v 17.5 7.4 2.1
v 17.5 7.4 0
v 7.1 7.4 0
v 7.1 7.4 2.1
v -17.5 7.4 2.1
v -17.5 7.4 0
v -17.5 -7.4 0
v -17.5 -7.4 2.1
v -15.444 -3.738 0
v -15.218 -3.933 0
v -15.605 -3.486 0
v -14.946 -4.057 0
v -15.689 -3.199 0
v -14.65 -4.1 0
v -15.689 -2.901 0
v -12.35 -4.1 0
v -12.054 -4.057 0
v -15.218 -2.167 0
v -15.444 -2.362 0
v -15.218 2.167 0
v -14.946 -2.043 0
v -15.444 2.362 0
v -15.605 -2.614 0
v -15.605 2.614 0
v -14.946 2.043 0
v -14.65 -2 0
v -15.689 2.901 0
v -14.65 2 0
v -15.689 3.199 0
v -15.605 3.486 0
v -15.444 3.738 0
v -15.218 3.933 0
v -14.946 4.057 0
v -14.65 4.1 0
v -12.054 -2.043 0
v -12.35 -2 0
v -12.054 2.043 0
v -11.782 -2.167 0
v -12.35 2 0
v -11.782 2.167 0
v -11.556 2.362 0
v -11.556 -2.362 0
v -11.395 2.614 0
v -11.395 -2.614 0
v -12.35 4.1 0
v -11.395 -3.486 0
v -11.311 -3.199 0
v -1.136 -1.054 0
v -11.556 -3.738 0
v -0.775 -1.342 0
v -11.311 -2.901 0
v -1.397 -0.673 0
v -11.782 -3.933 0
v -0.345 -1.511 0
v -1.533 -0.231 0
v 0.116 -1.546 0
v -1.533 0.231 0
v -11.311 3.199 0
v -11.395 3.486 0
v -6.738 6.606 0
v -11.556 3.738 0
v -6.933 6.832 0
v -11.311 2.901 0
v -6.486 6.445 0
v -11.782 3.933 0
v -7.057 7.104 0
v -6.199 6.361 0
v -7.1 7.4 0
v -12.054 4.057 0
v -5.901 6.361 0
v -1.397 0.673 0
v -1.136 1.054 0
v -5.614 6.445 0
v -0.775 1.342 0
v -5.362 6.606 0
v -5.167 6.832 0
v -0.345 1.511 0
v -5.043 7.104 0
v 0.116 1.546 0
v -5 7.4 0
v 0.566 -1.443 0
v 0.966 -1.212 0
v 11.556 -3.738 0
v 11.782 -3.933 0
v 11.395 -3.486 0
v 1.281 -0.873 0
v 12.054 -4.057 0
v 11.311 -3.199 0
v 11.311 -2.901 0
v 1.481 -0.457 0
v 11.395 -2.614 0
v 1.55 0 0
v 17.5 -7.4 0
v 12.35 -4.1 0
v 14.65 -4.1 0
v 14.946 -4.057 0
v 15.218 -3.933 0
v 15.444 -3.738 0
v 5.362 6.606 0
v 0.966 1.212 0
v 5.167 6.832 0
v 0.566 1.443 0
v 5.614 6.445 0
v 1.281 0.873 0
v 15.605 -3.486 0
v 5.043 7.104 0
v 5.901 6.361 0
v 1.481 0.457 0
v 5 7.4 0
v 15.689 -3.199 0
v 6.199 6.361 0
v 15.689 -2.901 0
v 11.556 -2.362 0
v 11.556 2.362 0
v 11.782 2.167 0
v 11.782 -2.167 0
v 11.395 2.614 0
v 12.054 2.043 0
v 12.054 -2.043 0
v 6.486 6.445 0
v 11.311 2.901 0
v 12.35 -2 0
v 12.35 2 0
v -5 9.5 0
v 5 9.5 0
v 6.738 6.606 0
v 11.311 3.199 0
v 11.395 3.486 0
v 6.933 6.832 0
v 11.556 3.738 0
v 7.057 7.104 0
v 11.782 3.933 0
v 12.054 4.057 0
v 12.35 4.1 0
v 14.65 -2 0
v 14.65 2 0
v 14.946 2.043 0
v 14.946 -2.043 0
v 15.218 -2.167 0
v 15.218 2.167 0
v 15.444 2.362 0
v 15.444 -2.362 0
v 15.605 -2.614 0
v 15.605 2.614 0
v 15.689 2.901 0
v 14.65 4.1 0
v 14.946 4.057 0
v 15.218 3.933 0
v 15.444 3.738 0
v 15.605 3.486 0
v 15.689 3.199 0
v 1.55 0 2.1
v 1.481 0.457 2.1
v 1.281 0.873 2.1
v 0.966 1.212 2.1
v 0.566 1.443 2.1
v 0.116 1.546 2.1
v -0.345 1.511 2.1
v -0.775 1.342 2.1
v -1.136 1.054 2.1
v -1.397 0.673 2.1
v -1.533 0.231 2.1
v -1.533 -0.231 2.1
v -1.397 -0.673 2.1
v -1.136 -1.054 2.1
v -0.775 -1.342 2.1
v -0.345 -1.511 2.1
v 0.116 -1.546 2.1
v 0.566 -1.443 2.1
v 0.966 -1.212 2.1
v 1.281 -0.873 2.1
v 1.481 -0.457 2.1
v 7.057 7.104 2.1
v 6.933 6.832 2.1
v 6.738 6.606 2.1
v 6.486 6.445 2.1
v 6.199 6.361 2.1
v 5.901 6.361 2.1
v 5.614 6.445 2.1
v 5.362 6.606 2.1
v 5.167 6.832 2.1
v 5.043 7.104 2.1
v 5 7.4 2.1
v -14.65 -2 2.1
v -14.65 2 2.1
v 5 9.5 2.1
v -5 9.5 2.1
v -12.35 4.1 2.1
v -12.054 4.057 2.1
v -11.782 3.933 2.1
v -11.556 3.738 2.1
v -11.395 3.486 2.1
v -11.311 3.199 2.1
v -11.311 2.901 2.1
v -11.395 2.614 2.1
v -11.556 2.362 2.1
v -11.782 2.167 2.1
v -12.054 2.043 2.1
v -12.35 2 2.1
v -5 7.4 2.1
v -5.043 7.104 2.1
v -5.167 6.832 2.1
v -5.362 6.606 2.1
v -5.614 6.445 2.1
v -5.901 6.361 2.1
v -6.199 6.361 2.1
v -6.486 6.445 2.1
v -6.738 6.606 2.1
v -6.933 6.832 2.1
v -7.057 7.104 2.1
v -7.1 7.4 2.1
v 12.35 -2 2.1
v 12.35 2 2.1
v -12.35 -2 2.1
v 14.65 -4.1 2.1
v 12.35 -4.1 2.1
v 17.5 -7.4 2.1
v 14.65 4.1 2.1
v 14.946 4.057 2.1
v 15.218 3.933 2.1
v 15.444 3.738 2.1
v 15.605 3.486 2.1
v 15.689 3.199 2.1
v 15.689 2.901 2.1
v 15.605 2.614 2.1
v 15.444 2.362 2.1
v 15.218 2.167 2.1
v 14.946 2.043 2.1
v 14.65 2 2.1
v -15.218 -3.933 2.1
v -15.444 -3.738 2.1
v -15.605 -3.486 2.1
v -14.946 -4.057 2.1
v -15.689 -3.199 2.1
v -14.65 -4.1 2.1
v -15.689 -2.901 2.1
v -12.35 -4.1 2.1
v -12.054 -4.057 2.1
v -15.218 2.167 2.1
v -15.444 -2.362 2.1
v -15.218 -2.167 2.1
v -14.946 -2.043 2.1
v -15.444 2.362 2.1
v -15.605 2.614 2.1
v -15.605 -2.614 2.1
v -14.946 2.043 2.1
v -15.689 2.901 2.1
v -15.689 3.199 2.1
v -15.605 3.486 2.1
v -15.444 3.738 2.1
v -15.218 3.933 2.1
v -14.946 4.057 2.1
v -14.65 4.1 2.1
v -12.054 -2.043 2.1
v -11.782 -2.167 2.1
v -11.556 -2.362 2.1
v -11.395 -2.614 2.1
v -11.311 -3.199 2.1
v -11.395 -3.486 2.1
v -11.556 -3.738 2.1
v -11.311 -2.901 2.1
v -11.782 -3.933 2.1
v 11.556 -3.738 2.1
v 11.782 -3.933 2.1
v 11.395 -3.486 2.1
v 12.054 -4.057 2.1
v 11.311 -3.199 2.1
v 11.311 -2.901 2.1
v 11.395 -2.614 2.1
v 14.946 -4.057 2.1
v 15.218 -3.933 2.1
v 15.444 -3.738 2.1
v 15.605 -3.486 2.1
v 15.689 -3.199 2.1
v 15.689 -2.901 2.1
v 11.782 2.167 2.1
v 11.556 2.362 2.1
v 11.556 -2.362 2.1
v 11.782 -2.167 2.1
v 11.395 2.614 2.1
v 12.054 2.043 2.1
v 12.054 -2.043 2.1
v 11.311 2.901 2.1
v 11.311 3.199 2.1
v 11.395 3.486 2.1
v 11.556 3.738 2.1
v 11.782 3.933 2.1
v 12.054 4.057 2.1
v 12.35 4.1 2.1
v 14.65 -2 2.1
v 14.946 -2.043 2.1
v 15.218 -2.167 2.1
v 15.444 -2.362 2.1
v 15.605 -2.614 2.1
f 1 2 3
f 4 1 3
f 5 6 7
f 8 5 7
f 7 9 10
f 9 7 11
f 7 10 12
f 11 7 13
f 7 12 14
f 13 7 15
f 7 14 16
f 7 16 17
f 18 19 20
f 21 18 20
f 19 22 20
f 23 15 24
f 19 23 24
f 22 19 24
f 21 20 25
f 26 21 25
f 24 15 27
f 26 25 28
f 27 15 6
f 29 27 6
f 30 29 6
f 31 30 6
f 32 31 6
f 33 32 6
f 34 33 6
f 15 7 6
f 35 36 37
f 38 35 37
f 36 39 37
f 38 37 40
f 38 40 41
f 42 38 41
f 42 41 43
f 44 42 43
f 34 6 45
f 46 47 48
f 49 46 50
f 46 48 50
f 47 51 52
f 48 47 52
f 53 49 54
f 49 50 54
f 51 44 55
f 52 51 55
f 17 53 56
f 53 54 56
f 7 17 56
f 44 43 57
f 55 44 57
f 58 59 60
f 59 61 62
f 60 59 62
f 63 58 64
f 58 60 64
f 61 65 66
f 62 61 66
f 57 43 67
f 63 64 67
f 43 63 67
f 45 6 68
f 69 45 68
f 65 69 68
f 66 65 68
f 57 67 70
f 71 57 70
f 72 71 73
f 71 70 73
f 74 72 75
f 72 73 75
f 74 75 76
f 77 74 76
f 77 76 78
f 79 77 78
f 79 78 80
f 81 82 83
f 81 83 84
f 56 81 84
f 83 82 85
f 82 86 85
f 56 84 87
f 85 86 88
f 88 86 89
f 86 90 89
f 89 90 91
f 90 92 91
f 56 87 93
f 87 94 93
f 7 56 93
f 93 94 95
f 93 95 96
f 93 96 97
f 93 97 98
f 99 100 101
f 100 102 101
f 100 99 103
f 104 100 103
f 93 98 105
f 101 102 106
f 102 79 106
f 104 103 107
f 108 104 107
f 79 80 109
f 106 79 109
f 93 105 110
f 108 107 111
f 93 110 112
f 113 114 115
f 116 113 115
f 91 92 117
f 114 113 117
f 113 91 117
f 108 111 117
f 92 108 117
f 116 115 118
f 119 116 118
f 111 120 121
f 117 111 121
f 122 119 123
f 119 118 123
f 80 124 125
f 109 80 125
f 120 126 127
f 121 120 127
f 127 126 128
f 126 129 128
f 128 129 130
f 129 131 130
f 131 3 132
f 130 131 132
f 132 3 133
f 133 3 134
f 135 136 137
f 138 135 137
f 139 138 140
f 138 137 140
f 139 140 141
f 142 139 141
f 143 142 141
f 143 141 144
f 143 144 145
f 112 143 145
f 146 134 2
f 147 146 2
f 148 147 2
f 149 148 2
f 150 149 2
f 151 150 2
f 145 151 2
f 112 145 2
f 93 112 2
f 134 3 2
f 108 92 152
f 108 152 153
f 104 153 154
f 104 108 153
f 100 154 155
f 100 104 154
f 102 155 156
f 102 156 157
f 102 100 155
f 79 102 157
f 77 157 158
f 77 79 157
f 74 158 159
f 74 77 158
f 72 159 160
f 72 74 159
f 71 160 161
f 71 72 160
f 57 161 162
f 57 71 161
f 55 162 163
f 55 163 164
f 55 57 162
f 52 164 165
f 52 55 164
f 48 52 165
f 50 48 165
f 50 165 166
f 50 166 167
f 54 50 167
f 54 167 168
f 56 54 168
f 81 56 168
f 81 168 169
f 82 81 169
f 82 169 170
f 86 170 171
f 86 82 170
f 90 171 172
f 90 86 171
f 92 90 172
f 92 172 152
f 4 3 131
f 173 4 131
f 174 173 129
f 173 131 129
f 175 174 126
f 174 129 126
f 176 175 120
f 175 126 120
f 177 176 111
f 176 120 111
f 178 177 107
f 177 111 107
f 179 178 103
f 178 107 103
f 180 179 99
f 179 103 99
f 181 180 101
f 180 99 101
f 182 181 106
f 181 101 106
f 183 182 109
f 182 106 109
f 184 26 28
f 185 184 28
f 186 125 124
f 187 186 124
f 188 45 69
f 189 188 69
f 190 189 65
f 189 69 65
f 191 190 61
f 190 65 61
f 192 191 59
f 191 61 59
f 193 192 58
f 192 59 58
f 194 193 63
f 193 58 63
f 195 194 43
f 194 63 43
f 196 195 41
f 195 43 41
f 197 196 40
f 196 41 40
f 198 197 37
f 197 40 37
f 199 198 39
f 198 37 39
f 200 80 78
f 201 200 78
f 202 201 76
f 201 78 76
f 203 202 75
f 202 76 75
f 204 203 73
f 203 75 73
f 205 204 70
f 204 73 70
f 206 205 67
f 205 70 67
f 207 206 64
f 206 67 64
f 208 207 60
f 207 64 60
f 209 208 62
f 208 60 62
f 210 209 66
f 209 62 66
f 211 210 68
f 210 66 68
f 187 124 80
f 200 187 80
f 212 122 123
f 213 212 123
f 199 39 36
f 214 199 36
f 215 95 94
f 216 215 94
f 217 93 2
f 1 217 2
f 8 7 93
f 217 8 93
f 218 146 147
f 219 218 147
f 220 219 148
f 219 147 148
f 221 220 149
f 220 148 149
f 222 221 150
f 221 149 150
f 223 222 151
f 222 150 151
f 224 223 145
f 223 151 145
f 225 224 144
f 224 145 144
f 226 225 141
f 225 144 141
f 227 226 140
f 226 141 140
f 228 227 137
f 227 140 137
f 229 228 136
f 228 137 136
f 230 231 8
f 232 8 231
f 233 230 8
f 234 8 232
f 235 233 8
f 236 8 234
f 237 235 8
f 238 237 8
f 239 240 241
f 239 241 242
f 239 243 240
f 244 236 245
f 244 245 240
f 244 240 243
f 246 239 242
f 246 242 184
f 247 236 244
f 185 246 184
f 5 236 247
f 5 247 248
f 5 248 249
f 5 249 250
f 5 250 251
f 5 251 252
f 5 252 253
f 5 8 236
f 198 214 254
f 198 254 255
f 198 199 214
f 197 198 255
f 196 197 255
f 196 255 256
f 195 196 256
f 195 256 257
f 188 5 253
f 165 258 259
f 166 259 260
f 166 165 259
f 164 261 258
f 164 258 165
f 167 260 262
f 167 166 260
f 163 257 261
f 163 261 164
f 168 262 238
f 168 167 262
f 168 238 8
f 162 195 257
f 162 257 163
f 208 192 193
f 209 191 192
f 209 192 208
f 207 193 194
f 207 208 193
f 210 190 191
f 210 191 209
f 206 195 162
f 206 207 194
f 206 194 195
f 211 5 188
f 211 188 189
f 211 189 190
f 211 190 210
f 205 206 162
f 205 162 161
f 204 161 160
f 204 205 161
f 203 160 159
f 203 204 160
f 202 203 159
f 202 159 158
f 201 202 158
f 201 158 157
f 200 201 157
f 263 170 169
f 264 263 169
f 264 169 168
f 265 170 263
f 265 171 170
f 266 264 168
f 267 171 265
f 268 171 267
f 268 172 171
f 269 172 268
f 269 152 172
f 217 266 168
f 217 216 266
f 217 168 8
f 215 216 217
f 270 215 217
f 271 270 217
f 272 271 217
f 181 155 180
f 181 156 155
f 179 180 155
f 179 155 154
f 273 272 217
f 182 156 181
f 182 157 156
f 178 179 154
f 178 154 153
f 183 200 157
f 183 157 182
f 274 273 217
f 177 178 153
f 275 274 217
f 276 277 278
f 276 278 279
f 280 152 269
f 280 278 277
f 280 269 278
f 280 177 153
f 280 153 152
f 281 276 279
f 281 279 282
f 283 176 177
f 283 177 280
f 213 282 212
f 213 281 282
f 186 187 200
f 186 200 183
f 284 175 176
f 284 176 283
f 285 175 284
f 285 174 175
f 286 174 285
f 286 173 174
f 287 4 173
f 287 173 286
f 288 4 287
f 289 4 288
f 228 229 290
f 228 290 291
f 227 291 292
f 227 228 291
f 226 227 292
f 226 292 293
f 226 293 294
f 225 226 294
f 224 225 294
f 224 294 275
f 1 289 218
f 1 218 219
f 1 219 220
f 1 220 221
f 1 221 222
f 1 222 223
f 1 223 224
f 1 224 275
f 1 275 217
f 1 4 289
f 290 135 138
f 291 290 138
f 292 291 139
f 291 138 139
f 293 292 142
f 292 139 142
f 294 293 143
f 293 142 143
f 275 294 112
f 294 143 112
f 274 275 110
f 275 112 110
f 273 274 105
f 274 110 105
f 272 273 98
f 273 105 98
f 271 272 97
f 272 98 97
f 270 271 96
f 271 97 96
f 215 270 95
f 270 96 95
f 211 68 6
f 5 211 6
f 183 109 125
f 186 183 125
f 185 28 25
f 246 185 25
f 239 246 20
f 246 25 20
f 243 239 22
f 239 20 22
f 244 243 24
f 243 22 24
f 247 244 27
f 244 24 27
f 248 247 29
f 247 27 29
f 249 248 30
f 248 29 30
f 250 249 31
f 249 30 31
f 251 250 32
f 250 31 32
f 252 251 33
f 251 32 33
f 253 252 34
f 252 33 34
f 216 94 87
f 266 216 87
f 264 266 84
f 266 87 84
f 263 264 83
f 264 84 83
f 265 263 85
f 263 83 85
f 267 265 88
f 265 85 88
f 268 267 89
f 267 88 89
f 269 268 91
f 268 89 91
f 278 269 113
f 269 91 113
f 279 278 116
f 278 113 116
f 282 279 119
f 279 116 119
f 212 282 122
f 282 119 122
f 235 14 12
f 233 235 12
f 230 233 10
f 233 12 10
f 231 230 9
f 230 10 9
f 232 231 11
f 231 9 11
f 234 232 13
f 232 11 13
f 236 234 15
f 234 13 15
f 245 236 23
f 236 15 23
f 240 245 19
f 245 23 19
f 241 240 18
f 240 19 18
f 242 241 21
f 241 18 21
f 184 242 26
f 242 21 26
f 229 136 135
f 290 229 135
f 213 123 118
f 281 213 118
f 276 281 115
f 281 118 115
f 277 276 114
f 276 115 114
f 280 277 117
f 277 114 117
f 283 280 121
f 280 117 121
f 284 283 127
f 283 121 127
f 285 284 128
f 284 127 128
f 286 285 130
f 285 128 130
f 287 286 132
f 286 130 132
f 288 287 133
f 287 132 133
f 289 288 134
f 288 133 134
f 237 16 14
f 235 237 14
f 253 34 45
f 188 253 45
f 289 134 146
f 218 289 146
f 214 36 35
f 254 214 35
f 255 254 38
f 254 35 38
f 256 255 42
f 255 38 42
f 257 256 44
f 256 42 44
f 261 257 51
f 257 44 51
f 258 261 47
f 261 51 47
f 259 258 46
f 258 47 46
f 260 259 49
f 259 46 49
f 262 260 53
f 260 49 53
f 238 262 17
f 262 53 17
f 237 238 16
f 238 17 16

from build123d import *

# Parameters (mm, degrees)
SKETCH_1_R      = 1.55
EXTRUDE_1_DEPTH = 2.1


with BuildPart() as part:
    # 草图1 → 凸台-拉伸1 (new body)
    with BuildSketch(Plane.XY):
        with BuildLine():
            Line((-17.5, -7.4), (17.5, -7.4))
            Line((17.5, -7.4), (17.5, 7.4))
            Line((17.5, 7.4), (7.1, 7.4))
            ThreePointArc((7.1, 7.4), (6.05, 6.35), (5, 7.4))
            Line((5, 7.4), (5, 9.5))
            Line((5, 9.5), (-5, 9.5))
            Line((-5, 9.5), (-5, 7.4))
            ThreePointArc((-5, 7.4), (-6.05, 6.35), (-7.1, 7.4))
            Line((-7.1, 7.4), (-17.5, 7.4))
            Line((-17.5, 7.4), (-17.5, -7.4))
        make_face()
        with BuildLine():
            Line((-12.35, -4.1), (-14.65, -4.1))
            ThreePointArc((-14.65, -4.1), (-15.7, -3.05), (-14.65, -2))
            Line((-14.65, -2), (-14.65, 2))
            ThreePointArc((-14.65, 2), (-15.7, 3.05), (-14.65, 4.1))
            Line((-14.65, 4.1), (-12.35, 4.1))
            ThreePointArc((-12.35, 4.1), (-11.3, 3.05), (-12.35, 2))
            Line((-12.35, 2), (-12.35, -2))
            ThreePointArc((-12.35, -2), (-11.3, -3.05), (-12.35, -4.1))
        make_face(mode=Mode.SUBTRACT)
        Circle(SKETCH_1_R, mode=Mode.SUBTRACT)
        with BuildLine():
            ThreePointArc((12.35, 2), (11.3, 3.05), (12.35, 4.1))
            Line((12.35, 4.1), (14.65, 4.1))
            ThreePointArc((14.65, 4.1), (15.7, 3.05), (14.65, 2))
            Line((14.65, 2), (14.65, -2))
            ThreePointArc((14.65, -2), (15.7, -3.05), (14.65, -4.1))
            Line((14.65, -4.1), (12.35, -4.1))
            ThreePointArc((12.35, -4.1), (11.3, -3.05), (12.35, -2))
            Line((12.35, -2), (12.35, 2))
        make_face(mode=Mode.SUBTRACT)
    extrude(amount=EXTRUDE_1_DEPTH)


solid = part.part
